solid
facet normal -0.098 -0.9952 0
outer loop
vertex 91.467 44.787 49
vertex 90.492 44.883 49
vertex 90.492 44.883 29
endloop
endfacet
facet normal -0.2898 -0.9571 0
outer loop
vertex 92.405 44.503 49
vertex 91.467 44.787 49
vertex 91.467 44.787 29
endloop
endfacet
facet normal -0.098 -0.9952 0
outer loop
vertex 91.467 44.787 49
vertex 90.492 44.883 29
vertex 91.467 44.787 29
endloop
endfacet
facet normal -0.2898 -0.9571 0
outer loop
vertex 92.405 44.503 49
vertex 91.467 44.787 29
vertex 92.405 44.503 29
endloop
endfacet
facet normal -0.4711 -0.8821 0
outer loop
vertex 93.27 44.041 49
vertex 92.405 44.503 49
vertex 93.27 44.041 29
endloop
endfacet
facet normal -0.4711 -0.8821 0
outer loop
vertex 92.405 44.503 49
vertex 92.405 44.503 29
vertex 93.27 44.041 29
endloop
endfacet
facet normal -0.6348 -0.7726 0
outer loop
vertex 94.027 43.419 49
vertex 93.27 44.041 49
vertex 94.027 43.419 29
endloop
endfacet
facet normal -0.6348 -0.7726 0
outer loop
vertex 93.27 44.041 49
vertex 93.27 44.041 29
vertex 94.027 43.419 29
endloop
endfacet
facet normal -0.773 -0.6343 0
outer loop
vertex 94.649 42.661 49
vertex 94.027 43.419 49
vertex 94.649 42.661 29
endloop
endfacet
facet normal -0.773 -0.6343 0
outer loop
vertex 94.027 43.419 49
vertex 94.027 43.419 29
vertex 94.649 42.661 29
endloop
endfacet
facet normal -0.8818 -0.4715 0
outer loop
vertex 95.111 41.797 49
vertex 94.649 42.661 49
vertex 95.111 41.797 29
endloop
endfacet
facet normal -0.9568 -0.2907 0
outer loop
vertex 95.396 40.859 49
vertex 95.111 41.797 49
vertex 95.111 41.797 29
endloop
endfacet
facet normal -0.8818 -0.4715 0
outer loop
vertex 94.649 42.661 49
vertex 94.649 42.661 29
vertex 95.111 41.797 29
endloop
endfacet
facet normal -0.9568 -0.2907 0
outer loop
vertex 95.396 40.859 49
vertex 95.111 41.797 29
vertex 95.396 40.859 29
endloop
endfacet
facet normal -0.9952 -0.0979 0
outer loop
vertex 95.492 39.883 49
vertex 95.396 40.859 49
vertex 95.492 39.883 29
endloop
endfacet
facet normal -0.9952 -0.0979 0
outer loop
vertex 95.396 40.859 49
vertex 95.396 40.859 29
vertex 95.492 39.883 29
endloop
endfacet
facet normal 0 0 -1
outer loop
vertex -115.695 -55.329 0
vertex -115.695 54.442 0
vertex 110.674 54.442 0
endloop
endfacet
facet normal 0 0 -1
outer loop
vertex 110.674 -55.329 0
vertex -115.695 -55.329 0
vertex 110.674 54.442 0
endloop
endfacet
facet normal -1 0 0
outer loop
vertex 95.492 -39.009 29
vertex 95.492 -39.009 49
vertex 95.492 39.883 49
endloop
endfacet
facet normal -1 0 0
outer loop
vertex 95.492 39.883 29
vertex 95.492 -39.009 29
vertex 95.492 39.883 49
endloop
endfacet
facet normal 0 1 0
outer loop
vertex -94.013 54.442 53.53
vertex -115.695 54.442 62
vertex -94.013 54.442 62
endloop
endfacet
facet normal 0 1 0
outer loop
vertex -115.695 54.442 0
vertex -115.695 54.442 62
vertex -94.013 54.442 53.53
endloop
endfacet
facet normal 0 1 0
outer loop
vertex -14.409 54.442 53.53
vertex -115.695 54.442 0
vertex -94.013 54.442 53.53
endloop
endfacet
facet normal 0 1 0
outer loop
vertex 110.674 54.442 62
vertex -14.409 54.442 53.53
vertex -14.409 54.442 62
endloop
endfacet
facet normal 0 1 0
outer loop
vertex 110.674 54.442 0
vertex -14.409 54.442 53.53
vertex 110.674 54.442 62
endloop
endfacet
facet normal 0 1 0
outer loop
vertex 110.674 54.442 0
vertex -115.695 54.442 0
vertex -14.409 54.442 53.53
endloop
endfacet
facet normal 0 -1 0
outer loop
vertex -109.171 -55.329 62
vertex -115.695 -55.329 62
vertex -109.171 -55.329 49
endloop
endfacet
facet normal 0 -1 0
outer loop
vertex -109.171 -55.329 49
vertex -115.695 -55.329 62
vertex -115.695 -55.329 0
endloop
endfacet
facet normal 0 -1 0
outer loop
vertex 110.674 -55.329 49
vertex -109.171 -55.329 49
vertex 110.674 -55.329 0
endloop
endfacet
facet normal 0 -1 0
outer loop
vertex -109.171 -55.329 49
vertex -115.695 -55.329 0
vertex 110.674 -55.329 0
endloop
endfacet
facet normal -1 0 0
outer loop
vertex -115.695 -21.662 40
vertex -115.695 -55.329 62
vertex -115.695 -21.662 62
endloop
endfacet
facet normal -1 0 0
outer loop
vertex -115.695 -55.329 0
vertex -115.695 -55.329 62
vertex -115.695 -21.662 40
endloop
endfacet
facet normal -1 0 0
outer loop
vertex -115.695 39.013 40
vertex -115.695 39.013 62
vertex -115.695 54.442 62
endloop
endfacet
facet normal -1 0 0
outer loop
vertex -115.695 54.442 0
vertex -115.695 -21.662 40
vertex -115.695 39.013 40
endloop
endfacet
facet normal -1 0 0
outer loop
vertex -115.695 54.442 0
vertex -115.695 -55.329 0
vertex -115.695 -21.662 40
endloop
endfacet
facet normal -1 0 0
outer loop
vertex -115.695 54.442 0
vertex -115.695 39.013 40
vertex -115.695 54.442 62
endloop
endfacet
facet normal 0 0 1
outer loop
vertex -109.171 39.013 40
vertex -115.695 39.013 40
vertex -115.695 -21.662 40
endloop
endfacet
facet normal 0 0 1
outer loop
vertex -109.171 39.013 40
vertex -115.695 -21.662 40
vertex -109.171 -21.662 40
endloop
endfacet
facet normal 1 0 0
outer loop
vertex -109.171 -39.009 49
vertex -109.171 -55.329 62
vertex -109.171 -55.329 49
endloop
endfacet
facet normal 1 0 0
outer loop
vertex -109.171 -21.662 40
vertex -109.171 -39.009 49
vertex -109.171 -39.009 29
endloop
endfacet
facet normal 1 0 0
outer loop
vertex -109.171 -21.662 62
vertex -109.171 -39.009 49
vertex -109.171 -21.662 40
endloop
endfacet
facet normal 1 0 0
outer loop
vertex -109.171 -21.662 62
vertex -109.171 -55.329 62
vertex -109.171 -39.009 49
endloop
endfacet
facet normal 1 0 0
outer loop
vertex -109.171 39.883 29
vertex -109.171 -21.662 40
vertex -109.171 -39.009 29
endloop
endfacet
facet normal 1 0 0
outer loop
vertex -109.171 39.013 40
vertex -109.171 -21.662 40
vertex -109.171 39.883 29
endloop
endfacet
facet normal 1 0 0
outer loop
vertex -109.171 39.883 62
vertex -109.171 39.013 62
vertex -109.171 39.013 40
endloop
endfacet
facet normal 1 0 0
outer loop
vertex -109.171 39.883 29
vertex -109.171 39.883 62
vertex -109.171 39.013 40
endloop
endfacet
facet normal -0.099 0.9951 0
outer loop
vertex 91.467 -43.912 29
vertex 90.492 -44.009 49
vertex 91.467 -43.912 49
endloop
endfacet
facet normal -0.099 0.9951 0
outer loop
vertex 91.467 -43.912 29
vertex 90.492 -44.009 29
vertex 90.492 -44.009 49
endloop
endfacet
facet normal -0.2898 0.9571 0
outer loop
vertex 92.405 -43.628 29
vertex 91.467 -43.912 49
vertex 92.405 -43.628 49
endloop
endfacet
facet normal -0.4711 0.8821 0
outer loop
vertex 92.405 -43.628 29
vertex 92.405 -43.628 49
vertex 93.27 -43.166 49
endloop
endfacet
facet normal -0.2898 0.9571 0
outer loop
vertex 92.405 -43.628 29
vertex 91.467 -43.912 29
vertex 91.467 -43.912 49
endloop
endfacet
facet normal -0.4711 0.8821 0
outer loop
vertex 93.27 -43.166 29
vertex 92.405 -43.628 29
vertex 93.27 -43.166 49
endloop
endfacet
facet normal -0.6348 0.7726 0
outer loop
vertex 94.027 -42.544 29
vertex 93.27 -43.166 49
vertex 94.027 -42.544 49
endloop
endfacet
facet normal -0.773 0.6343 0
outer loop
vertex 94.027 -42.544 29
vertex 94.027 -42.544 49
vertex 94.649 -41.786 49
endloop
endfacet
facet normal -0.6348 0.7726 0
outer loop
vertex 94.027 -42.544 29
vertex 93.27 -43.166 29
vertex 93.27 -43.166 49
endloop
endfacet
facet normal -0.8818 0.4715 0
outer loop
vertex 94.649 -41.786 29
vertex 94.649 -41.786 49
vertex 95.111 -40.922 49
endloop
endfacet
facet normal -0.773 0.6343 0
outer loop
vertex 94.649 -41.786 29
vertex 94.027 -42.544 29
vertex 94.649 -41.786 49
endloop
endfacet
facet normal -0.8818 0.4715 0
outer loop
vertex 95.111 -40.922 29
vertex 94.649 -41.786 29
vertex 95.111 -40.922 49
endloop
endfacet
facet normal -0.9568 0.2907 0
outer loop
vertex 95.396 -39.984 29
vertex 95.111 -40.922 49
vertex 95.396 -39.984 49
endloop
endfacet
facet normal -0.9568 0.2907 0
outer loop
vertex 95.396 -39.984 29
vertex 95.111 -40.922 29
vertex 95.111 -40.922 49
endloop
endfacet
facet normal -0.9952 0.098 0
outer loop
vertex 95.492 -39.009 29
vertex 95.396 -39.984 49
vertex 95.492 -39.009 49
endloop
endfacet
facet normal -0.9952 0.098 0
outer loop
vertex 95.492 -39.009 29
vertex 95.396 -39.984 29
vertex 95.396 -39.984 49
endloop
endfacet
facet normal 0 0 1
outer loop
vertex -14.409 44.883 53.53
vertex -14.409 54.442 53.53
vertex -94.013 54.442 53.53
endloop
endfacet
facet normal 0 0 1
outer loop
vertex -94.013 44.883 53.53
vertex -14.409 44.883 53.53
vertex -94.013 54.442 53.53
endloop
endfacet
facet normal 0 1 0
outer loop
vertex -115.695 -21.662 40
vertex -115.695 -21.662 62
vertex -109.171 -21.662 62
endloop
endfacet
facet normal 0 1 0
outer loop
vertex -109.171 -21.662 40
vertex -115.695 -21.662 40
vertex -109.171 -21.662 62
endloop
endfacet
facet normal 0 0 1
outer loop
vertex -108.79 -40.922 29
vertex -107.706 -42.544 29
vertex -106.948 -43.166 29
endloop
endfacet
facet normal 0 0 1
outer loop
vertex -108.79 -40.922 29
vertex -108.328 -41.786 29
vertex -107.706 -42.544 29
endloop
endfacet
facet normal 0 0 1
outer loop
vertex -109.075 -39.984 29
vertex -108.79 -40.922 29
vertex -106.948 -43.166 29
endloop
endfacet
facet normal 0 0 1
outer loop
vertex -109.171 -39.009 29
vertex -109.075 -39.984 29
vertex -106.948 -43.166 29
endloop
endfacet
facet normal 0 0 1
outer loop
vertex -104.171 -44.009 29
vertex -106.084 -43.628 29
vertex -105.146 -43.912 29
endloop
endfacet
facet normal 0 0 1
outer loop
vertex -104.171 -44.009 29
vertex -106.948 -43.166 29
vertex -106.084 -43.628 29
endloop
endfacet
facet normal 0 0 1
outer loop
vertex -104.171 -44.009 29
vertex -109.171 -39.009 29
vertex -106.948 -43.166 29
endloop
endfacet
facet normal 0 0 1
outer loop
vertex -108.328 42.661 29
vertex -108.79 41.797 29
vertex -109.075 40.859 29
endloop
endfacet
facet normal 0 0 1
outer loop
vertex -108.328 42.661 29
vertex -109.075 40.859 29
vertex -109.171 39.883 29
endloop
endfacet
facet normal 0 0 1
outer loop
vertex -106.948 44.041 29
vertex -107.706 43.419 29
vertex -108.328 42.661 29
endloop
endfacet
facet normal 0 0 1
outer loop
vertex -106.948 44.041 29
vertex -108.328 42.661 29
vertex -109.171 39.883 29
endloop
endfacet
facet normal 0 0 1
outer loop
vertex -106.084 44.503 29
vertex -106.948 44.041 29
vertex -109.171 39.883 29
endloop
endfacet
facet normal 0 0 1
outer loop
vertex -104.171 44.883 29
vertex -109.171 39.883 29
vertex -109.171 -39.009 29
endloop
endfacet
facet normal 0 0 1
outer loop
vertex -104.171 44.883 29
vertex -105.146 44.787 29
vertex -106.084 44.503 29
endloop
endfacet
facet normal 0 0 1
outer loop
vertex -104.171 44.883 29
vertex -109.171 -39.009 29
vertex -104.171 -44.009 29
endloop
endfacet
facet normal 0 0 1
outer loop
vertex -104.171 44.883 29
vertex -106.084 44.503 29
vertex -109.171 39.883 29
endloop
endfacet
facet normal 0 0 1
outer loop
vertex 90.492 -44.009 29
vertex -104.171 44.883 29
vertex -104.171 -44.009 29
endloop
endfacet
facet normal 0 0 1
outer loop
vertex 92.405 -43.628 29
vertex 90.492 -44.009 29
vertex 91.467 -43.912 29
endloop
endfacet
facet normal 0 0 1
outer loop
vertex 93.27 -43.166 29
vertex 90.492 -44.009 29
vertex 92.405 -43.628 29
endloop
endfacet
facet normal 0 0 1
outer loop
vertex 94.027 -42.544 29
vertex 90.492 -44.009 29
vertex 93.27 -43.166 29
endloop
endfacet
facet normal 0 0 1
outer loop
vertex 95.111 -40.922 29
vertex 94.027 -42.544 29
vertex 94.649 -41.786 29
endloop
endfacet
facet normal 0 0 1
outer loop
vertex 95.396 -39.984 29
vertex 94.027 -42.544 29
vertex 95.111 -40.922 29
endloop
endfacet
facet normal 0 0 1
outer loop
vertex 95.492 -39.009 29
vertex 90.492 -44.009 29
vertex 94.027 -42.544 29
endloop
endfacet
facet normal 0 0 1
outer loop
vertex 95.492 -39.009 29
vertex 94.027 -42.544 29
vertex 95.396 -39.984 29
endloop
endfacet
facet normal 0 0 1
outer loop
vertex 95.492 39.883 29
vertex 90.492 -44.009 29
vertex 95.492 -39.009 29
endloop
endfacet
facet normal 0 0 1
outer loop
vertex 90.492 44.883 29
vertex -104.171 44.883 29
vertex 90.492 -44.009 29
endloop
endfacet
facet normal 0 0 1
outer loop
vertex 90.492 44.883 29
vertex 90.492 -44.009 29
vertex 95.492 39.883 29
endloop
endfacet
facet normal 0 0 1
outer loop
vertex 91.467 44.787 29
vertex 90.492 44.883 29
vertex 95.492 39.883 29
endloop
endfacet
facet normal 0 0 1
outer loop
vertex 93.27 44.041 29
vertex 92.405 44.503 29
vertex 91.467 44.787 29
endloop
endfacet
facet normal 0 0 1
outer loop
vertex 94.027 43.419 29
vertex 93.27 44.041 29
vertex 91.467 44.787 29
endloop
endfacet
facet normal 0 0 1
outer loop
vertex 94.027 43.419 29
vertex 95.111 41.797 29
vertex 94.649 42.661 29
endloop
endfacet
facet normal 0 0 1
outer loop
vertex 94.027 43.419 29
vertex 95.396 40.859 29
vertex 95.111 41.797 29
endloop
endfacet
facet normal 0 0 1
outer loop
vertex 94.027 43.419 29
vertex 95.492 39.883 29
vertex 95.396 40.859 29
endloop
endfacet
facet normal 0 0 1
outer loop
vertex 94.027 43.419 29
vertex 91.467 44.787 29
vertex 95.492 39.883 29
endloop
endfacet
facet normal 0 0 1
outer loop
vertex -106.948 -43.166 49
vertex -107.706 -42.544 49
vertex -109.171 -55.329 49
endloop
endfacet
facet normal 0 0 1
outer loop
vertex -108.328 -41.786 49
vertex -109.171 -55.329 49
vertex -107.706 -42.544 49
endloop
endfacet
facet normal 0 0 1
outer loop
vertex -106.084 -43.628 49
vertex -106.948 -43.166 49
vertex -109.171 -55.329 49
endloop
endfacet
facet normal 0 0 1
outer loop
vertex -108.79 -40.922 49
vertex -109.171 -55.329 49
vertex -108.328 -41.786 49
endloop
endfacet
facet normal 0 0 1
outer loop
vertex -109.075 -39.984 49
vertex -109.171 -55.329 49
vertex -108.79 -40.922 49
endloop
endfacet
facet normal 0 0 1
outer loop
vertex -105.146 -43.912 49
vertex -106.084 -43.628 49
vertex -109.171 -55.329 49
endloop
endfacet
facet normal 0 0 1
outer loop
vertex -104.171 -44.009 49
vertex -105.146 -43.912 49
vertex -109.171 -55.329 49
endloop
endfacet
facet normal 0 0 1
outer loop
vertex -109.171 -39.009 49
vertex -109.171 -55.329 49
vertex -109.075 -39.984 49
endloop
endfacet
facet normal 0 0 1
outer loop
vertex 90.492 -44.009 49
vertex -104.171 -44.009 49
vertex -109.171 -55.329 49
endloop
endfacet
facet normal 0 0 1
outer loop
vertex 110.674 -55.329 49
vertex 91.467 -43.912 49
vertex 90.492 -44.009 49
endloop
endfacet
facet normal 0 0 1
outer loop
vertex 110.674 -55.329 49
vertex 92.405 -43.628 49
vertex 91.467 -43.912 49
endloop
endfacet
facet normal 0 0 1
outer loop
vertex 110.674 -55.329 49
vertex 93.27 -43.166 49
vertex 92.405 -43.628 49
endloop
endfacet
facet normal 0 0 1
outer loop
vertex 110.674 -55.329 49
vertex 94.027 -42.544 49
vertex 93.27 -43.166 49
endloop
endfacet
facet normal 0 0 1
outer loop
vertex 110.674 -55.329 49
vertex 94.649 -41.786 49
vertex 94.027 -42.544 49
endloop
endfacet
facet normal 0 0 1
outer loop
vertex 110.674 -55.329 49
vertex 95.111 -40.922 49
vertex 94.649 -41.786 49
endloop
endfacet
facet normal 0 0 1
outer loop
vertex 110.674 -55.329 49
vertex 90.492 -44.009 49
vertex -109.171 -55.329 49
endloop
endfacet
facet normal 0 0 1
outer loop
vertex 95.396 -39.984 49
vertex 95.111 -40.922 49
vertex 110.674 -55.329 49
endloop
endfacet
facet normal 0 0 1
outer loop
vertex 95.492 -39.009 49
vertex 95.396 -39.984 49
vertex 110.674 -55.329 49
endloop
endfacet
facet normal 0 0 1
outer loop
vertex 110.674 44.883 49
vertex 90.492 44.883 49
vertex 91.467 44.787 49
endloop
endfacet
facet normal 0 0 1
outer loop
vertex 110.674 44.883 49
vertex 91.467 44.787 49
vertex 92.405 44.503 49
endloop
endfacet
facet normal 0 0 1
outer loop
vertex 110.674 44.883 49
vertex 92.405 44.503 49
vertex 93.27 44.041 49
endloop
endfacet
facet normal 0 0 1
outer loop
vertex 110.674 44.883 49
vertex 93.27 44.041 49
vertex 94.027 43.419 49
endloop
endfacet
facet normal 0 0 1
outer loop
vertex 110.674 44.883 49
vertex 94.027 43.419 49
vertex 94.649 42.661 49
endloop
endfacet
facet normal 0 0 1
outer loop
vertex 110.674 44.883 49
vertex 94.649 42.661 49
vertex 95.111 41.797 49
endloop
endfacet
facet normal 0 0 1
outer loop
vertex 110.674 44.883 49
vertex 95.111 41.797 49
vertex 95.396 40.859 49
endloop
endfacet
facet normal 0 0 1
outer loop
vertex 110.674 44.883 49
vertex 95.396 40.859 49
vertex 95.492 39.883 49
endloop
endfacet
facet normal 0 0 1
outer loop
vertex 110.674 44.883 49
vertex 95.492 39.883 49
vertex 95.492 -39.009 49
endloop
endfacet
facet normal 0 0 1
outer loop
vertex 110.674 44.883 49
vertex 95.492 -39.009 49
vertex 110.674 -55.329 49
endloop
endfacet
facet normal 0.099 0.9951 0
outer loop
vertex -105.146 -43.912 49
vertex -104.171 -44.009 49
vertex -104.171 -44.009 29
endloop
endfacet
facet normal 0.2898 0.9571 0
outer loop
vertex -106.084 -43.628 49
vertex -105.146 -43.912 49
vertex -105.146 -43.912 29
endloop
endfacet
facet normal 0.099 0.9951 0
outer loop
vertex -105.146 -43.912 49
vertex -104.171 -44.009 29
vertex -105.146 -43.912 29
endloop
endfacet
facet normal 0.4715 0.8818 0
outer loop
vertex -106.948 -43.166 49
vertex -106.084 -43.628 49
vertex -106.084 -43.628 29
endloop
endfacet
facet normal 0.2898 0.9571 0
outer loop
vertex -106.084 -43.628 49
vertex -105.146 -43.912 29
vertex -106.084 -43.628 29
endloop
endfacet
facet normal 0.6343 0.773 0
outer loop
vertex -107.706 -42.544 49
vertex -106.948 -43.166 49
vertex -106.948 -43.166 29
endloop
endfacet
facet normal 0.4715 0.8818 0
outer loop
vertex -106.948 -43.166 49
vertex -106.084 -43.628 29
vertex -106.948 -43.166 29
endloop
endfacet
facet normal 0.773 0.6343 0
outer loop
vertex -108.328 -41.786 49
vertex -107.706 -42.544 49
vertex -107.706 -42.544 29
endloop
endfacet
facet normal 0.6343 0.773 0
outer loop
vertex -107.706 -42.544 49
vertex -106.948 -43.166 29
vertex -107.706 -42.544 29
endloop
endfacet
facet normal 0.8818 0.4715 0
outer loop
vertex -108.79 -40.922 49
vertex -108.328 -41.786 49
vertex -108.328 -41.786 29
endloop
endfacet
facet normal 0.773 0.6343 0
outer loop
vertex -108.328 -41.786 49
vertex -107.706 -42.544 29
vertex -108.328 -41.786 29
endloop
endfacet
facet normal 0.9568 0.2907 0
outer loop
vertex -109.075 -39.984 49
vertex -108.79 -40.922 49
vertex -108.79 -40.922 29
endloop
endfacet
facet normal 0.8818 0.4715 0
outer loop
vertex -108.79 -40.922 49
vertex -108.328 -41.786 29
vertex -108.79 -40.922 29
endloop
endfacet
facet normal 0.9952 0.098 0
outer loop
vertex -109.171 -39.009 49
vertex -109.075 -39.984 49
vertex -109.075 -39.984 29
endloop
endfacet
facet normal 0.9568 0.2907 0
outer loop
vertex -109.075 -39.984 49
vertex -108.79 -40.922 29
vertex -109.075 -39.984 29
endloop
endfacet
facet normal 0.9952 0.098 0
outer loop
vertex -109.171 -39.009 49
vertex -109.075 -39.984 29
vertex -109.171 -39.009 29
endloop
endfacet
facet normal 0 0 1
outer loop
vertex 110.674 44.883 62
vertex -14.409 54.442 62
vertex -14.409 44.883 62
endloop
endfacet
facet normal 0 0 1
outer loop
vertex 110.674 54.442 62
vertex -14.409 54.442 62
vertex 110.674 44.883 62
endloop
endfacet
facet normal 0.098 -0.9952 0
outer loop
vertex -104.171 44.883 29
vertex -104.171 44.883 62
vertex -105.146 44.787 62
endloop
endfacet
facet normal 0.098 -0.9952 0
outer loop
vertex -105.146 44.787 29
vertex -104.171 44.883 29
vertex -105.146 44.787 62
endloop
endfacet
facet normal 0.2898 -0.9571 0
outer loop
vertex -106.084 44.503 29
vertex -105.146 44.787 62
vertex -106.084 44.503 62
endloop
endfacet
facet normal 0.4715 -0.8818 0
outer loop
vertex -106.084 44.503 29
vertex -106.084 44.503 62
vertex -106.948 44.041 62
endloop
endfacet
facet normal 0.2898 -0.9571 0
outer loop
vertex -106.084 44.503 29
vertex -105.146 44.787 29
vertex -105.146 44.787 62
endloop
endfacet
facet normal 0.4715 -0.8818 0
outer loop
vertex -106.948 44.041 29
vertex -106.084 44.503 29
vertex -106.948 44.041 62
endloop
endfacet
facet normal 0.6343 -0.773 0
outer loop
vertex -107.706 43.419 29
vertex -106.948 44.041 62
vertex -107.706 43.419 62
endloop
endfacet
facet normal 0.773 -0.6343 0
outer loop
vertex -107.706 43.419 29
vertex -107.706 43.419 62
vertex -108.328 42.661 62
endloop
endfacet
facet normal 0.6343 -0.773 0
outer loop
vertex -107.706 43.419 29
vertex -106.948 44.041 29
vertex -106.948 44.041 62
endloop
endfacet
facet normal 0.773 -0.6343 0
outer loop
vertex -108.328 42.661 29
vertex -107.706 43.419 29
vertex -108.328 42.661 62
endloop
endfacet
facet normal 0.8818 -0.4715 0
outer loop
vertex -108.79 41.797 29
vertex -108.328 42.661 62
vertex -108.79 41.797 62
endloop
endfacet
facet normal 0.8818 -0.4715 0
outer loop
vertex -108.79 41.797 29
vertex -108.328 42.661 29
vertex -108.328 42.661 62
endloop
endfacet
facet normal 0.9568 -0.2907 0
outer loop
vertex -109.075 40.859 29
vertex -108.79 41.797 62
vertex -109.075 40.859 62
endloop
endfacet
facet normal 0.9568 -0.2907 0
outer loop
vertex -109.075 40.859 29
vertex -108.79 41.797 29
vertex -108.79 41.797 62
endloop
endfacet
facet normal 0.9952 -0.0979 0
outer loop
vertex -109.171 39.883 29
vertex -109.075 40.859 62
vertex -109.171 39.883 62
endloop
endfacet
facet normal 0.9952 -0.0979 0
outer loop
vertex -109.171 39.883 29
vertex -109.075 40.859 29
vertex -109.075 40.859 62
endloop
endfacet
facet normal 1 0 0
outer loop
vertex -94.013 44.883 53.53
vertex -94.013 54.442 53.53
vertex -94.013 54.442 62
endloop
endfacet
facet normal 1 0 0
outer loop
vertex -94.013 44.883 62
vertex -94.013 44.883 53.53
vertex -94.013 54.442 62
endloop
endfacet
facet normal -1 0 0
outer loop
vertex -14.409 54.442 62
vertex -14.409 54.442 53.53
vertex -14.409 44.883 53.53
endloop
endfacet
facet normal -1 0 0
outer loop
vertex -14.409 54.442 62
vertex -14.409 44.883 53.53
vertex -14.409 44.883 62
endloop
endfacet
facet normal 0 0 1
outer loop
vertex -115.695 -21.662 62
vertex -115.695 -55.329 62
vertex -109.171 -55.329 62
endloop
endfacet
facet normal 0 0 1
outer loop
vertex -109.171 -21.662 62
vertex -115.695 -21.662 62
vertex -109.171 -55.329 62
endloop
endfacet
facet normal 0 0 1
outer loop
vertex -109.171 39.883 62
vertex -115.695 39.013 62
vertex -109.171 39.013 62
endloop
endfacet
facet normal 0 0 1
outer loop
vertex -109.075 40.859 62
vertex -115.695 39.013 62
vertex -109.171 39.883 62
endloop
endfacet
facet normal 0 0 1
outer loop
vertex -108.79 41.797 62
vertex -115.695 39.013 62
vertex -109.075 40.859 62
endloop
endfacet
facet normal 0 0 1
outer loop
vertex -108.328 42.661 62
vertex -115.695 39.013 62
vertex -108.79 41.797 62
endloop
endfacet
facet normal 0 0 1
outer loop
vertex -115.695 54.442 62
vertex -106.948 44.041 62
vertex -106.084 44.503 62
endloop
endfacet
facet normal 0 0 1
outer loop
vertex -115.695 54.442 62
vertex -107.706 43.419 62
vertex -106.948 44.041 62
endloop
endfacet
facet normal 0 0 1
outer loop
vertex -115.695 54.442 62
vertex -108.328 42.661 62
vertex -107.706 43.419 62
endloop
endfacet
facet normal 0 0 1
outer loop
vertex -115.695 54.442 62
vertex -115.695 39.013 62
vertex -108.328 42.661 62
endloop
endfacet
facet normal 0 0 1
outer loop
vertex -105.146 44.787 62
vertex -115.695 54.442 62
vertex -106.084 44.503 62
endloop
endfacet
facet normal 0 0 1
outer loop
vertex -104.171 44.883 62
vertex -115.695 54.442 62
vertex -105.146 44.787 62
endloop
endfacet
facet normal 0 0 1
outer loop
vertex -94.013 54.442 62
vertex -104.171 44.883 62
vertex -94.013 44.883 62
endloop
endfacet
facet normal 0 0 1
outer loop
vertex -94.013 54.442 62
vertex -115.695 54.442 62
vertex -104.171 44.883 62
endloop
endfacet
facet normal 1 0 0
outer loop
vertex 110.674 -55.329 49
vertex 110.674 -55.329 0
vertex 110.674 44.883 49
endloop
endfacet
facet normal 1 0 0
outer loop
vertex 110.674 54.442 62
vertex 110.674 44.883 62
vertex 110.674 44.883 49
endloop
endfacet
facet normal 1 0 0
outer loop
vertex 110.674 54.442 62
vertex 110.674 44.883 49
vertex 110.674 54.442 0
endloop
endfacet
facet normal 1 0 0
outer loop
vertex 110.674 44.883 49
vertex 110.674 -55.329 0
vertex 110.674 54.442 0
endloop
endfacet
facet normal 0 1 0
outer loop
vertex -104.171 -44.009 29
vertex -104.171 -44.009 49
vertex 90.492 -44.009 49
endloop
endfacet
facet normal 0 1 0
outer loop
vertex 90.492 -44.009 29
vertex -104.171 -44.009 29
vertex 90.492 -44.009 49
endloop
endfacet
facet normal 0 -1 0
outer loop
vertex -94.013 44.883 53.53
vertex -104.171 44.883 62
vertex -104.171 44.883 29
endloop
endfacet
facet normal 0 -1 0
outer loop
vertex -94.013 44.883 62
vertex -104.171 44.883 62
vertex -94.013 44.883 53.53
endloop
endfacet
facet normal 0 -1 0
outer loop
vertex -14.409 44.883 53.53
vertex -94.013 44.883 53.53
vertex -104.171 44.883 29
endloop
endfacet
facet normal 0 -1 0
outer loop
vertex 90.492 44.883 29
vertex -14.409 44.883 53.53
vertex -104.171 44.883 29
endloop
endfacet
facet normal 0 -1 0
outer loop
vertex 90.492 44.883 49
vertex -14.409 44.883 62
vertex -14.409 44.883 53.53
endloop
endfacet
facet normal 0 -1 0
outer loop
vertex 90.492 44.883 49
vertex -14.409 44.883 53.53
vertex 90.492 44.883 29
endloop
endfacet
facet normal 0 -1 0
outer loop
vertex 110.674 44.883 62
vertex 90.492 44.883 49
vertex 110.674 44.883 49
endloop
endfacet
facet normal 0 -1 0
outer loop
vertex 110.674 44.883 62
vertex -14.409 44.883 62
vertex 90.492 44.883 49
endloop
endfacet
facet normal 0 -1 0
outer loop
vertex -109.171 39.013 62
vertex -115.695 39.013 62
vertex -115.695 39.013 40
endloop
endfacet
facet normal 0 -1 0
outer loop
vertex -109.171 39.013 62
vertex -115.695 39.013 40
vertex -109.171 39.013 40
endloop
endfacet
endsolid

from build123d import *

# Parameters (mm, degrees)
F0_W      = 226.3691648841
F0_H      = 109.7707115114
F1_DEPTH  = 62
F2_W      = 219.8443636298
F2_H      = 100.2121046185
F3_DEPTH  = 13
F4_W      = 6.5248012543
F4_H      = 60.6752280146
F5_DEPTH  = 22
F7_DEPTH  = 20
F8_R      = 5
F9_R      = 5
F10_R     = 5
F11_R     = 5
F12_W     = 79.6035556123
F12_H     = 8.4695416391
F13_DEPTH = 25


with BuildPart() as f1:
    # F0 (on Top) → F1 (new body)
    with BuildSketch(Plane.XY):
        with Locations((-2.5108121336, -0.4434902221)):
            Rectangle(F0_W, F0_H)
    extrude(amount=F1_DEPTH)

    # F2 (on face) → F3 (cut)
    with BuildSketch(Plane.XY.offset(62)):
        with Locations((0.7515884936, -5.2227936685)):
            Rectangle(F2_W, F2_H)
    extrude(amount=-F3_DEPTH, mode=Mode.SUBTRACT)

    # F4 (on face) → F5 (cut)
    with BuildSketch(Plane.XY.offset(62)):
        with Locations((-112.4329939485, 8.6751645431)):
            Rectangle(F4_W, F4_H)
    extrude(amount=-F5_DEPTH, mode=Mode.SUBTRACT)

    # F6 (on face) → F7 (cut)
    with BuildSketch(Plane.XY.offset(49)):
        Polygon((95.4916924238, 44.8832586408), (-109.1705933213, 44.8832586408), (-109.1705933213, 39.0127785504), (-109.1705933213, -21.6624494642), (-109.1705933213, -44.0085157752), (95.4916924238, -44.0085157752), align=None)
    extrude(amount=-F7_DEPTH, mode=Mode.SUBTRACT)

    # F8
    f8_edges = [f1.edges().sort_by_distance(p)[0] for p in [
        (95.491692, 44.883259, 39),
    ]]
    fillet(f8_edges, radius=F8_R)

    # F9
    f9_edges = [f1.edges().sort_by_distance(p)[0] for p in [
        (95.491692, -44.008516, 39),
    ]]
    fillet(f9_edges, radius=F9_R)

    # F10
    f10_edges = [f1.edges().sort_by_distance(p)[0] for p in [
        (-109.170593, -44.008516, 39),
    ]]
    fillet(f10_edges, radius=F10_R)

    # F11
    f11_edges = [f1.edges().sort_by_distance(p)[0] for p in [
        (-109.170593, 44.883259, 45.5),
    ]]
    fillet(f11_edges, radius=F11_R)

    # F12 (on face) → F13 (cut)
    with BuildSketch(Plane(origin=(0, 54.4418655336, 0), x_dir=(-1, 0, 0), z_dir=(0, 1, 0))):
        with Locations((54.2112276889, 57.7652291805)):
            Rectangle(F12_W, F12_H)
    extrude(amount=-F13_DEPTH, mode=Mode.SUBTRACT)


solid = f1.part
